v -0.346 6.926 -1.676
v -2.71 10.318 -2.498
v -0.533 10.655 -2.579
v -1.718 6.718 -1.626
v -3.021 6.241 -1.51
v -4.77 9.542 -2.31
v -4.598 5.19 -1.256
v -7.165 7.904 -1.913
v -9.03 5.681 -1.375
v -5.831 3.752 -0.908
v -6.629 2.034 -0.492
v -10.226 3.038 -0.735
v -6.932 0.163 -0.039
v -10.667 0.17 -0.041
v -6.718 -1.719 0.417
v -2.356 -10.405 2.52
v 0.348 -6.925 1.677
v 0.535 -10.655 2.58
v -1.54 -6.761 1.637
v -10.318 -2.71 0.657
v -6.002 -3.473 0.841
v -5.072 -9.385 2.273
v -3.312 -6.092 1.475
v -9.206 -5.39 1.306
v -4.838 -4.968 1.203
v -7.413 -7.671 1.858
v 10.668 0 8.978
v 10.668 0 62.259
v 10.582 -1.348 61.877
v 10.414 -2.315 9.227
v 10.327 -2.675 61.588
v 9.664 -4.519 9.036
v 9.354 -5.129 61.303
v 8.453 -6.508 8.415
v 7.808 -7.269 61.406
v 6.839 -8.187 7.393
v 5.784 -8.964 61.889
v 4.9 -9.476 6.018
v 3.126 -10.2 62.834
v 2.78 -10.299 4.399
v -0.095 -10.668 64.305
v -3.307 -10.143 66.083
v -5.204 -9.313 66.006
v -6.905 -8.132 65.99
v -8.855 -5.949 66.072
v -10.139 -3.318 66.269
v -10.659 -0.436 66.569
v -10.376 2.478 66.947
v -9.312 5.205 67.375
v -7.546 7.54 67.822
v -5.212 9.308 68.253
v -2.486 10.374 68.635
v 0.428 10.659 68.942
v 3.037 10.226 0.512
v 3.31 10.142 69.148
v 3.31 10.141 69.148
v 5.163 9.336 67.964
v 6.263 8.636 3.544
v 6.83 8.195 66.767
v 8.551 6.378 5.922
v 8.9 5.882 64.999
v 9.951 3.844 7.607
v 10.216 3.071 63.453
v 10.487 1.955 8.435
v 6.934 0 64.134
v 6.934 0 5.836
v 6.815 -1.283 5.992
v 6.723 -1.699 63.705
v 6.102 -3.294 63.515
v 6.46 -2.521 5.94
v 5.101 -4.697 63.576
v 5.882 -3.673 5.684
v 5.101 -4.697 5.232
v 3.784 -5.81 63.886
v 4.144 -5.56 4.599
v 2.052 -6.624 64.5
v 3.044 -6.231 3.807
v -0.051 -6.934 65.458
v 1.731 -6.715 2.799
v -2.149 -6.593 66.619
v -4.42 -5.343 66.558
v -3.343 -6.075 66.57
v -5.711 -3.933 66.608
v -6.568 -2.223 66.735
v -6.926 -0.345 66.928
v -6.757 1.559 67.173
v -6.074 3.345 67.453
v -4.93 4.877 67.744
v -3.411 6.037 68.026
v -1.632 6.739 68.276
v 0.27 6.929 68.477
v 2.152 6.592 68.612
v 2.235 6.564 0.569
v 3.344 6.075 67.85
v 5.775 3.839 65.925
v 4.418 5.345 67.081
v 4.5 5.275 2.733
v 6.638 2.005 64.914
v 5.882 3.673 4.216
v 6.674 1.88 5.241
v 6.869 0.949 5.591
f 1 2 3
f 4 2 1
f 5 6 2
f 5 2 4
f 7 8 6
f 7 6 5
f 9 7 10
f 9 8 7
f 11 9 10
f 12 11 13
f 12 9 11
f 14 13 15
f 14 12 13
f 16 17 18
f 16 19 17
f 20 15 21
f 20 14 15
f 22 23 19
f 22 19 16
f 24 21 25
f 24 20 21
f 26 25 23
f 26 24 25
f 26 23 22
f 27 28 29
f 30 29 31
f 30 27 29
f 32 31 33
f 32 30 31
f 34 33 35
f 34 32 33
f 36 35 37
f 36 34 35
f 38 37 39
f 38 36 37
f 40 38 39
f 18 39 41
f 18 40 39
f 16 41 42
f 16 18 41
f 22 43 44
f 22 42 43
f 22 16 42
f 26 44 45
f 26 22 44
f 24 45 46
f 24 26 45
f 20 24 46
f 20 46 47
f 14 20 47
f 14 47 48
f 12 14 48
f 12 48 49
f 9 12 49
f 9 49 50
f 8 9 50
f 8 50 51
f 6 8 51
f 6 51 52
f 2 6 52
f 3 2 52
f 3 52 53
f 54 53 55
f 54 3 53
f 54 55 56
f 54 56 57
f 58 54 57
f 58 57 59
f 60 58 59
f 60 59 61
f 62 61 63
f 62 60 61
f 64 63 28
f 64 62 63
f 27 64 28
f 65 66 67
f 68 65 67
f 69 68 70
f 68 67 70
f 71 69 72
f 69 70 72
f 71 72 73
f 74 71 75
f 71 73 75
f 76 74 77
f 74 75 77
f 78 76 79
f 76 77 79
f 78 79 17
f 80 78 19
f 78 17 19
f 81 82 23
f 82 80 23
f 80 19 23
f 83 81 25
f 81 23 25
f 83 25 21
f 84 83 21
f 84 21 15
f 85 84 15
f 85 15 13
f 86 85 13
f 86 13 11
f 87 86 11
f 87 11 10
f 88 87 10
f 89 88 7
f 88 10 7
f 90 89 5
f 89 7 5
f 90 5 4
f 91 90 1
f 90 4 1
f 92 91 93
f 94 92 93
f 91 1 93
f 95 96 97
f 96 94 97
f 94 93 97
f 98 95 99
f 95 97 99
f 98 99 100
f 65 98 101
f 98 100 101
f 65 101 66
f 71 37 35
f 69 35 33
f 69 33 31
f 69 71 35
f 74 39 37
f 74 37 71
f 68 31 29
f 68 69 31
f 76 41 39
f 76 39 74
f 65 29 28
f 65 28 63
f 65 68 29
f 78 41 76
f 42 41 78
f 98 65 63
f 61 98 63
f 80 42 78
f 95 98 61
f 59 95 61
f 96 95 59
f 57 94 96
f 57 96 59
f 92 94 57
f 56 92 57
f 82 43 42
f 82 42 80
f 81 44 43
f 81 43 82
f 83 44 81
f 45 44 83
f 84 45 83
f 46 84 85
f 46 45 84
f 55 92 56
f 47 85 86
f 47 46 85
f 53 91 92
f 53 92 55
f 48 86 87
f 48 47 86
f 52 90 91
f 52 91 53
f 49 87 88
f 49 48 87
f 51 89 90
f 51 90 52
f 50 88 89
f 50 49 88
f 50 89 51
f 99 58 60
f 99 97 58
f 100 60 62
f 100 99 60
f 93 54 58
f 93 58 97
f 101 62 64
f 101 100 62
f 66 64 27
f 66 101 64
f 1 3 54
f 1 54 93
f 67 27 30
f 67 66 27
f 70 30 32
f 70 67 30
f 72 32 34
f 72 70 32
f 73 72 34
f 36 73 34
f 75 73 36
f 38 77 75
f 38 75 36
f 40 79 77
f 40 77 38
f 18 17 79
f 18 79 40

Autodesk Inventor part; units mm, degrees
ref_plane "Start Plane" through (0, 0, -2.5822) normal (0, 0, 1) x (1, 0, 0)
ref_plane "End Plane" through (0, 0, 69.1479) normal (0, 0, 1) x (1, 0, 0)
sketch "Sketch" plane through (0, 0, 0) normal (0, 0, 1) x (1, 0, 0)
  circle A0 centre (0, 0) radius 6.9342
  circle A1 centre (0, 0) radius 10.668
  dimension "d0" = 21.336
  dimension "d1" = 3.7338
extrude "Body" add sketch "Sketch" along normal up to surface (71.7301 mm away) from surface at -2.5822
sketch "Sketch3" plane through (0, 0, 0) normal (0, 0, 1) x (1, 0, 0)
  line L0 (0, 0) -> (10, 0)
ref_plane "Work Plane3" through (0, 0, 0) normal (0, -1, 0) x (1, 0, 0)
sketch "Sketch4" plane through (0, 0, 0) normal (0, -1, 0) x (1, 0, 0)
  line L0 (-2, -2.5822) -> (12, -2.5822)
  line L1 (-2, 69.1479) -> (12, 69.1479)
  dimension "d7" = 71.7301
ref_plane "Work Plane4" through (6.5224, 8.4418, 69.2424) normal (-0.0922, -0.1193, 0.9886) x (0.9957, -0.0055, 0.0922)
split "Split1" plane through (6.5224, 8.4418, 69.2424) removes the side toward (-0.0922, -0.1193, 0.9886)
ref_plane "Work Plane5" through (0, 10.668, -2.5822) normal (0, -0.2353, -0.9719) x (1, 0, 0)
split "Split2" plane through (0, 10.668, -2.5822) removes the side toward (0, -0.2353, -0.9719)
ref_plane "Work Plane6" through (-10.3791, 2.4658, -9.228) normal (0.6365, -0.1512, -0.7563) x (-0.6625, 0.395, -0.6365)
split "Split3" plane through (-10.3791, 2.4658, -9.228) removes the side toward (0.6365, -0.1512, -0.7563)
ref_plane "Work Plane7" through (-9.0379, 5.6677, 73.9403) normal (0.432, -0.2709, 0.8602) x (0.8997, 0.0629, -0.432)
split "Split4" plane through (-9.0379, 5.6677, 73.9403) removes the side toward (0.432, -0.2709, 0.8602)
equation "\"d0\" = G_H"
equation "\"d1\" = G_T"
equation "\"d2\" = G_L"
equation "\"G_H\" = 21.336"
equation "\"G_T\" = 3.7338"
equation "\"G_L\" = 71.72685"
equation "\"G_OFFSET_START\" = 2.58216"
equation "\"G_OFFSET_END\" = 1.53222"
equation "\"d4\" = -G_OFFSET_START"
equation "\"d5\" = G_OFFSET_END + B_L"
equation "\"B_L\" = 67.6157"
properties part number "ANSI - 1/2 x 0.147 - 2.824" material "Steel, Mild"
